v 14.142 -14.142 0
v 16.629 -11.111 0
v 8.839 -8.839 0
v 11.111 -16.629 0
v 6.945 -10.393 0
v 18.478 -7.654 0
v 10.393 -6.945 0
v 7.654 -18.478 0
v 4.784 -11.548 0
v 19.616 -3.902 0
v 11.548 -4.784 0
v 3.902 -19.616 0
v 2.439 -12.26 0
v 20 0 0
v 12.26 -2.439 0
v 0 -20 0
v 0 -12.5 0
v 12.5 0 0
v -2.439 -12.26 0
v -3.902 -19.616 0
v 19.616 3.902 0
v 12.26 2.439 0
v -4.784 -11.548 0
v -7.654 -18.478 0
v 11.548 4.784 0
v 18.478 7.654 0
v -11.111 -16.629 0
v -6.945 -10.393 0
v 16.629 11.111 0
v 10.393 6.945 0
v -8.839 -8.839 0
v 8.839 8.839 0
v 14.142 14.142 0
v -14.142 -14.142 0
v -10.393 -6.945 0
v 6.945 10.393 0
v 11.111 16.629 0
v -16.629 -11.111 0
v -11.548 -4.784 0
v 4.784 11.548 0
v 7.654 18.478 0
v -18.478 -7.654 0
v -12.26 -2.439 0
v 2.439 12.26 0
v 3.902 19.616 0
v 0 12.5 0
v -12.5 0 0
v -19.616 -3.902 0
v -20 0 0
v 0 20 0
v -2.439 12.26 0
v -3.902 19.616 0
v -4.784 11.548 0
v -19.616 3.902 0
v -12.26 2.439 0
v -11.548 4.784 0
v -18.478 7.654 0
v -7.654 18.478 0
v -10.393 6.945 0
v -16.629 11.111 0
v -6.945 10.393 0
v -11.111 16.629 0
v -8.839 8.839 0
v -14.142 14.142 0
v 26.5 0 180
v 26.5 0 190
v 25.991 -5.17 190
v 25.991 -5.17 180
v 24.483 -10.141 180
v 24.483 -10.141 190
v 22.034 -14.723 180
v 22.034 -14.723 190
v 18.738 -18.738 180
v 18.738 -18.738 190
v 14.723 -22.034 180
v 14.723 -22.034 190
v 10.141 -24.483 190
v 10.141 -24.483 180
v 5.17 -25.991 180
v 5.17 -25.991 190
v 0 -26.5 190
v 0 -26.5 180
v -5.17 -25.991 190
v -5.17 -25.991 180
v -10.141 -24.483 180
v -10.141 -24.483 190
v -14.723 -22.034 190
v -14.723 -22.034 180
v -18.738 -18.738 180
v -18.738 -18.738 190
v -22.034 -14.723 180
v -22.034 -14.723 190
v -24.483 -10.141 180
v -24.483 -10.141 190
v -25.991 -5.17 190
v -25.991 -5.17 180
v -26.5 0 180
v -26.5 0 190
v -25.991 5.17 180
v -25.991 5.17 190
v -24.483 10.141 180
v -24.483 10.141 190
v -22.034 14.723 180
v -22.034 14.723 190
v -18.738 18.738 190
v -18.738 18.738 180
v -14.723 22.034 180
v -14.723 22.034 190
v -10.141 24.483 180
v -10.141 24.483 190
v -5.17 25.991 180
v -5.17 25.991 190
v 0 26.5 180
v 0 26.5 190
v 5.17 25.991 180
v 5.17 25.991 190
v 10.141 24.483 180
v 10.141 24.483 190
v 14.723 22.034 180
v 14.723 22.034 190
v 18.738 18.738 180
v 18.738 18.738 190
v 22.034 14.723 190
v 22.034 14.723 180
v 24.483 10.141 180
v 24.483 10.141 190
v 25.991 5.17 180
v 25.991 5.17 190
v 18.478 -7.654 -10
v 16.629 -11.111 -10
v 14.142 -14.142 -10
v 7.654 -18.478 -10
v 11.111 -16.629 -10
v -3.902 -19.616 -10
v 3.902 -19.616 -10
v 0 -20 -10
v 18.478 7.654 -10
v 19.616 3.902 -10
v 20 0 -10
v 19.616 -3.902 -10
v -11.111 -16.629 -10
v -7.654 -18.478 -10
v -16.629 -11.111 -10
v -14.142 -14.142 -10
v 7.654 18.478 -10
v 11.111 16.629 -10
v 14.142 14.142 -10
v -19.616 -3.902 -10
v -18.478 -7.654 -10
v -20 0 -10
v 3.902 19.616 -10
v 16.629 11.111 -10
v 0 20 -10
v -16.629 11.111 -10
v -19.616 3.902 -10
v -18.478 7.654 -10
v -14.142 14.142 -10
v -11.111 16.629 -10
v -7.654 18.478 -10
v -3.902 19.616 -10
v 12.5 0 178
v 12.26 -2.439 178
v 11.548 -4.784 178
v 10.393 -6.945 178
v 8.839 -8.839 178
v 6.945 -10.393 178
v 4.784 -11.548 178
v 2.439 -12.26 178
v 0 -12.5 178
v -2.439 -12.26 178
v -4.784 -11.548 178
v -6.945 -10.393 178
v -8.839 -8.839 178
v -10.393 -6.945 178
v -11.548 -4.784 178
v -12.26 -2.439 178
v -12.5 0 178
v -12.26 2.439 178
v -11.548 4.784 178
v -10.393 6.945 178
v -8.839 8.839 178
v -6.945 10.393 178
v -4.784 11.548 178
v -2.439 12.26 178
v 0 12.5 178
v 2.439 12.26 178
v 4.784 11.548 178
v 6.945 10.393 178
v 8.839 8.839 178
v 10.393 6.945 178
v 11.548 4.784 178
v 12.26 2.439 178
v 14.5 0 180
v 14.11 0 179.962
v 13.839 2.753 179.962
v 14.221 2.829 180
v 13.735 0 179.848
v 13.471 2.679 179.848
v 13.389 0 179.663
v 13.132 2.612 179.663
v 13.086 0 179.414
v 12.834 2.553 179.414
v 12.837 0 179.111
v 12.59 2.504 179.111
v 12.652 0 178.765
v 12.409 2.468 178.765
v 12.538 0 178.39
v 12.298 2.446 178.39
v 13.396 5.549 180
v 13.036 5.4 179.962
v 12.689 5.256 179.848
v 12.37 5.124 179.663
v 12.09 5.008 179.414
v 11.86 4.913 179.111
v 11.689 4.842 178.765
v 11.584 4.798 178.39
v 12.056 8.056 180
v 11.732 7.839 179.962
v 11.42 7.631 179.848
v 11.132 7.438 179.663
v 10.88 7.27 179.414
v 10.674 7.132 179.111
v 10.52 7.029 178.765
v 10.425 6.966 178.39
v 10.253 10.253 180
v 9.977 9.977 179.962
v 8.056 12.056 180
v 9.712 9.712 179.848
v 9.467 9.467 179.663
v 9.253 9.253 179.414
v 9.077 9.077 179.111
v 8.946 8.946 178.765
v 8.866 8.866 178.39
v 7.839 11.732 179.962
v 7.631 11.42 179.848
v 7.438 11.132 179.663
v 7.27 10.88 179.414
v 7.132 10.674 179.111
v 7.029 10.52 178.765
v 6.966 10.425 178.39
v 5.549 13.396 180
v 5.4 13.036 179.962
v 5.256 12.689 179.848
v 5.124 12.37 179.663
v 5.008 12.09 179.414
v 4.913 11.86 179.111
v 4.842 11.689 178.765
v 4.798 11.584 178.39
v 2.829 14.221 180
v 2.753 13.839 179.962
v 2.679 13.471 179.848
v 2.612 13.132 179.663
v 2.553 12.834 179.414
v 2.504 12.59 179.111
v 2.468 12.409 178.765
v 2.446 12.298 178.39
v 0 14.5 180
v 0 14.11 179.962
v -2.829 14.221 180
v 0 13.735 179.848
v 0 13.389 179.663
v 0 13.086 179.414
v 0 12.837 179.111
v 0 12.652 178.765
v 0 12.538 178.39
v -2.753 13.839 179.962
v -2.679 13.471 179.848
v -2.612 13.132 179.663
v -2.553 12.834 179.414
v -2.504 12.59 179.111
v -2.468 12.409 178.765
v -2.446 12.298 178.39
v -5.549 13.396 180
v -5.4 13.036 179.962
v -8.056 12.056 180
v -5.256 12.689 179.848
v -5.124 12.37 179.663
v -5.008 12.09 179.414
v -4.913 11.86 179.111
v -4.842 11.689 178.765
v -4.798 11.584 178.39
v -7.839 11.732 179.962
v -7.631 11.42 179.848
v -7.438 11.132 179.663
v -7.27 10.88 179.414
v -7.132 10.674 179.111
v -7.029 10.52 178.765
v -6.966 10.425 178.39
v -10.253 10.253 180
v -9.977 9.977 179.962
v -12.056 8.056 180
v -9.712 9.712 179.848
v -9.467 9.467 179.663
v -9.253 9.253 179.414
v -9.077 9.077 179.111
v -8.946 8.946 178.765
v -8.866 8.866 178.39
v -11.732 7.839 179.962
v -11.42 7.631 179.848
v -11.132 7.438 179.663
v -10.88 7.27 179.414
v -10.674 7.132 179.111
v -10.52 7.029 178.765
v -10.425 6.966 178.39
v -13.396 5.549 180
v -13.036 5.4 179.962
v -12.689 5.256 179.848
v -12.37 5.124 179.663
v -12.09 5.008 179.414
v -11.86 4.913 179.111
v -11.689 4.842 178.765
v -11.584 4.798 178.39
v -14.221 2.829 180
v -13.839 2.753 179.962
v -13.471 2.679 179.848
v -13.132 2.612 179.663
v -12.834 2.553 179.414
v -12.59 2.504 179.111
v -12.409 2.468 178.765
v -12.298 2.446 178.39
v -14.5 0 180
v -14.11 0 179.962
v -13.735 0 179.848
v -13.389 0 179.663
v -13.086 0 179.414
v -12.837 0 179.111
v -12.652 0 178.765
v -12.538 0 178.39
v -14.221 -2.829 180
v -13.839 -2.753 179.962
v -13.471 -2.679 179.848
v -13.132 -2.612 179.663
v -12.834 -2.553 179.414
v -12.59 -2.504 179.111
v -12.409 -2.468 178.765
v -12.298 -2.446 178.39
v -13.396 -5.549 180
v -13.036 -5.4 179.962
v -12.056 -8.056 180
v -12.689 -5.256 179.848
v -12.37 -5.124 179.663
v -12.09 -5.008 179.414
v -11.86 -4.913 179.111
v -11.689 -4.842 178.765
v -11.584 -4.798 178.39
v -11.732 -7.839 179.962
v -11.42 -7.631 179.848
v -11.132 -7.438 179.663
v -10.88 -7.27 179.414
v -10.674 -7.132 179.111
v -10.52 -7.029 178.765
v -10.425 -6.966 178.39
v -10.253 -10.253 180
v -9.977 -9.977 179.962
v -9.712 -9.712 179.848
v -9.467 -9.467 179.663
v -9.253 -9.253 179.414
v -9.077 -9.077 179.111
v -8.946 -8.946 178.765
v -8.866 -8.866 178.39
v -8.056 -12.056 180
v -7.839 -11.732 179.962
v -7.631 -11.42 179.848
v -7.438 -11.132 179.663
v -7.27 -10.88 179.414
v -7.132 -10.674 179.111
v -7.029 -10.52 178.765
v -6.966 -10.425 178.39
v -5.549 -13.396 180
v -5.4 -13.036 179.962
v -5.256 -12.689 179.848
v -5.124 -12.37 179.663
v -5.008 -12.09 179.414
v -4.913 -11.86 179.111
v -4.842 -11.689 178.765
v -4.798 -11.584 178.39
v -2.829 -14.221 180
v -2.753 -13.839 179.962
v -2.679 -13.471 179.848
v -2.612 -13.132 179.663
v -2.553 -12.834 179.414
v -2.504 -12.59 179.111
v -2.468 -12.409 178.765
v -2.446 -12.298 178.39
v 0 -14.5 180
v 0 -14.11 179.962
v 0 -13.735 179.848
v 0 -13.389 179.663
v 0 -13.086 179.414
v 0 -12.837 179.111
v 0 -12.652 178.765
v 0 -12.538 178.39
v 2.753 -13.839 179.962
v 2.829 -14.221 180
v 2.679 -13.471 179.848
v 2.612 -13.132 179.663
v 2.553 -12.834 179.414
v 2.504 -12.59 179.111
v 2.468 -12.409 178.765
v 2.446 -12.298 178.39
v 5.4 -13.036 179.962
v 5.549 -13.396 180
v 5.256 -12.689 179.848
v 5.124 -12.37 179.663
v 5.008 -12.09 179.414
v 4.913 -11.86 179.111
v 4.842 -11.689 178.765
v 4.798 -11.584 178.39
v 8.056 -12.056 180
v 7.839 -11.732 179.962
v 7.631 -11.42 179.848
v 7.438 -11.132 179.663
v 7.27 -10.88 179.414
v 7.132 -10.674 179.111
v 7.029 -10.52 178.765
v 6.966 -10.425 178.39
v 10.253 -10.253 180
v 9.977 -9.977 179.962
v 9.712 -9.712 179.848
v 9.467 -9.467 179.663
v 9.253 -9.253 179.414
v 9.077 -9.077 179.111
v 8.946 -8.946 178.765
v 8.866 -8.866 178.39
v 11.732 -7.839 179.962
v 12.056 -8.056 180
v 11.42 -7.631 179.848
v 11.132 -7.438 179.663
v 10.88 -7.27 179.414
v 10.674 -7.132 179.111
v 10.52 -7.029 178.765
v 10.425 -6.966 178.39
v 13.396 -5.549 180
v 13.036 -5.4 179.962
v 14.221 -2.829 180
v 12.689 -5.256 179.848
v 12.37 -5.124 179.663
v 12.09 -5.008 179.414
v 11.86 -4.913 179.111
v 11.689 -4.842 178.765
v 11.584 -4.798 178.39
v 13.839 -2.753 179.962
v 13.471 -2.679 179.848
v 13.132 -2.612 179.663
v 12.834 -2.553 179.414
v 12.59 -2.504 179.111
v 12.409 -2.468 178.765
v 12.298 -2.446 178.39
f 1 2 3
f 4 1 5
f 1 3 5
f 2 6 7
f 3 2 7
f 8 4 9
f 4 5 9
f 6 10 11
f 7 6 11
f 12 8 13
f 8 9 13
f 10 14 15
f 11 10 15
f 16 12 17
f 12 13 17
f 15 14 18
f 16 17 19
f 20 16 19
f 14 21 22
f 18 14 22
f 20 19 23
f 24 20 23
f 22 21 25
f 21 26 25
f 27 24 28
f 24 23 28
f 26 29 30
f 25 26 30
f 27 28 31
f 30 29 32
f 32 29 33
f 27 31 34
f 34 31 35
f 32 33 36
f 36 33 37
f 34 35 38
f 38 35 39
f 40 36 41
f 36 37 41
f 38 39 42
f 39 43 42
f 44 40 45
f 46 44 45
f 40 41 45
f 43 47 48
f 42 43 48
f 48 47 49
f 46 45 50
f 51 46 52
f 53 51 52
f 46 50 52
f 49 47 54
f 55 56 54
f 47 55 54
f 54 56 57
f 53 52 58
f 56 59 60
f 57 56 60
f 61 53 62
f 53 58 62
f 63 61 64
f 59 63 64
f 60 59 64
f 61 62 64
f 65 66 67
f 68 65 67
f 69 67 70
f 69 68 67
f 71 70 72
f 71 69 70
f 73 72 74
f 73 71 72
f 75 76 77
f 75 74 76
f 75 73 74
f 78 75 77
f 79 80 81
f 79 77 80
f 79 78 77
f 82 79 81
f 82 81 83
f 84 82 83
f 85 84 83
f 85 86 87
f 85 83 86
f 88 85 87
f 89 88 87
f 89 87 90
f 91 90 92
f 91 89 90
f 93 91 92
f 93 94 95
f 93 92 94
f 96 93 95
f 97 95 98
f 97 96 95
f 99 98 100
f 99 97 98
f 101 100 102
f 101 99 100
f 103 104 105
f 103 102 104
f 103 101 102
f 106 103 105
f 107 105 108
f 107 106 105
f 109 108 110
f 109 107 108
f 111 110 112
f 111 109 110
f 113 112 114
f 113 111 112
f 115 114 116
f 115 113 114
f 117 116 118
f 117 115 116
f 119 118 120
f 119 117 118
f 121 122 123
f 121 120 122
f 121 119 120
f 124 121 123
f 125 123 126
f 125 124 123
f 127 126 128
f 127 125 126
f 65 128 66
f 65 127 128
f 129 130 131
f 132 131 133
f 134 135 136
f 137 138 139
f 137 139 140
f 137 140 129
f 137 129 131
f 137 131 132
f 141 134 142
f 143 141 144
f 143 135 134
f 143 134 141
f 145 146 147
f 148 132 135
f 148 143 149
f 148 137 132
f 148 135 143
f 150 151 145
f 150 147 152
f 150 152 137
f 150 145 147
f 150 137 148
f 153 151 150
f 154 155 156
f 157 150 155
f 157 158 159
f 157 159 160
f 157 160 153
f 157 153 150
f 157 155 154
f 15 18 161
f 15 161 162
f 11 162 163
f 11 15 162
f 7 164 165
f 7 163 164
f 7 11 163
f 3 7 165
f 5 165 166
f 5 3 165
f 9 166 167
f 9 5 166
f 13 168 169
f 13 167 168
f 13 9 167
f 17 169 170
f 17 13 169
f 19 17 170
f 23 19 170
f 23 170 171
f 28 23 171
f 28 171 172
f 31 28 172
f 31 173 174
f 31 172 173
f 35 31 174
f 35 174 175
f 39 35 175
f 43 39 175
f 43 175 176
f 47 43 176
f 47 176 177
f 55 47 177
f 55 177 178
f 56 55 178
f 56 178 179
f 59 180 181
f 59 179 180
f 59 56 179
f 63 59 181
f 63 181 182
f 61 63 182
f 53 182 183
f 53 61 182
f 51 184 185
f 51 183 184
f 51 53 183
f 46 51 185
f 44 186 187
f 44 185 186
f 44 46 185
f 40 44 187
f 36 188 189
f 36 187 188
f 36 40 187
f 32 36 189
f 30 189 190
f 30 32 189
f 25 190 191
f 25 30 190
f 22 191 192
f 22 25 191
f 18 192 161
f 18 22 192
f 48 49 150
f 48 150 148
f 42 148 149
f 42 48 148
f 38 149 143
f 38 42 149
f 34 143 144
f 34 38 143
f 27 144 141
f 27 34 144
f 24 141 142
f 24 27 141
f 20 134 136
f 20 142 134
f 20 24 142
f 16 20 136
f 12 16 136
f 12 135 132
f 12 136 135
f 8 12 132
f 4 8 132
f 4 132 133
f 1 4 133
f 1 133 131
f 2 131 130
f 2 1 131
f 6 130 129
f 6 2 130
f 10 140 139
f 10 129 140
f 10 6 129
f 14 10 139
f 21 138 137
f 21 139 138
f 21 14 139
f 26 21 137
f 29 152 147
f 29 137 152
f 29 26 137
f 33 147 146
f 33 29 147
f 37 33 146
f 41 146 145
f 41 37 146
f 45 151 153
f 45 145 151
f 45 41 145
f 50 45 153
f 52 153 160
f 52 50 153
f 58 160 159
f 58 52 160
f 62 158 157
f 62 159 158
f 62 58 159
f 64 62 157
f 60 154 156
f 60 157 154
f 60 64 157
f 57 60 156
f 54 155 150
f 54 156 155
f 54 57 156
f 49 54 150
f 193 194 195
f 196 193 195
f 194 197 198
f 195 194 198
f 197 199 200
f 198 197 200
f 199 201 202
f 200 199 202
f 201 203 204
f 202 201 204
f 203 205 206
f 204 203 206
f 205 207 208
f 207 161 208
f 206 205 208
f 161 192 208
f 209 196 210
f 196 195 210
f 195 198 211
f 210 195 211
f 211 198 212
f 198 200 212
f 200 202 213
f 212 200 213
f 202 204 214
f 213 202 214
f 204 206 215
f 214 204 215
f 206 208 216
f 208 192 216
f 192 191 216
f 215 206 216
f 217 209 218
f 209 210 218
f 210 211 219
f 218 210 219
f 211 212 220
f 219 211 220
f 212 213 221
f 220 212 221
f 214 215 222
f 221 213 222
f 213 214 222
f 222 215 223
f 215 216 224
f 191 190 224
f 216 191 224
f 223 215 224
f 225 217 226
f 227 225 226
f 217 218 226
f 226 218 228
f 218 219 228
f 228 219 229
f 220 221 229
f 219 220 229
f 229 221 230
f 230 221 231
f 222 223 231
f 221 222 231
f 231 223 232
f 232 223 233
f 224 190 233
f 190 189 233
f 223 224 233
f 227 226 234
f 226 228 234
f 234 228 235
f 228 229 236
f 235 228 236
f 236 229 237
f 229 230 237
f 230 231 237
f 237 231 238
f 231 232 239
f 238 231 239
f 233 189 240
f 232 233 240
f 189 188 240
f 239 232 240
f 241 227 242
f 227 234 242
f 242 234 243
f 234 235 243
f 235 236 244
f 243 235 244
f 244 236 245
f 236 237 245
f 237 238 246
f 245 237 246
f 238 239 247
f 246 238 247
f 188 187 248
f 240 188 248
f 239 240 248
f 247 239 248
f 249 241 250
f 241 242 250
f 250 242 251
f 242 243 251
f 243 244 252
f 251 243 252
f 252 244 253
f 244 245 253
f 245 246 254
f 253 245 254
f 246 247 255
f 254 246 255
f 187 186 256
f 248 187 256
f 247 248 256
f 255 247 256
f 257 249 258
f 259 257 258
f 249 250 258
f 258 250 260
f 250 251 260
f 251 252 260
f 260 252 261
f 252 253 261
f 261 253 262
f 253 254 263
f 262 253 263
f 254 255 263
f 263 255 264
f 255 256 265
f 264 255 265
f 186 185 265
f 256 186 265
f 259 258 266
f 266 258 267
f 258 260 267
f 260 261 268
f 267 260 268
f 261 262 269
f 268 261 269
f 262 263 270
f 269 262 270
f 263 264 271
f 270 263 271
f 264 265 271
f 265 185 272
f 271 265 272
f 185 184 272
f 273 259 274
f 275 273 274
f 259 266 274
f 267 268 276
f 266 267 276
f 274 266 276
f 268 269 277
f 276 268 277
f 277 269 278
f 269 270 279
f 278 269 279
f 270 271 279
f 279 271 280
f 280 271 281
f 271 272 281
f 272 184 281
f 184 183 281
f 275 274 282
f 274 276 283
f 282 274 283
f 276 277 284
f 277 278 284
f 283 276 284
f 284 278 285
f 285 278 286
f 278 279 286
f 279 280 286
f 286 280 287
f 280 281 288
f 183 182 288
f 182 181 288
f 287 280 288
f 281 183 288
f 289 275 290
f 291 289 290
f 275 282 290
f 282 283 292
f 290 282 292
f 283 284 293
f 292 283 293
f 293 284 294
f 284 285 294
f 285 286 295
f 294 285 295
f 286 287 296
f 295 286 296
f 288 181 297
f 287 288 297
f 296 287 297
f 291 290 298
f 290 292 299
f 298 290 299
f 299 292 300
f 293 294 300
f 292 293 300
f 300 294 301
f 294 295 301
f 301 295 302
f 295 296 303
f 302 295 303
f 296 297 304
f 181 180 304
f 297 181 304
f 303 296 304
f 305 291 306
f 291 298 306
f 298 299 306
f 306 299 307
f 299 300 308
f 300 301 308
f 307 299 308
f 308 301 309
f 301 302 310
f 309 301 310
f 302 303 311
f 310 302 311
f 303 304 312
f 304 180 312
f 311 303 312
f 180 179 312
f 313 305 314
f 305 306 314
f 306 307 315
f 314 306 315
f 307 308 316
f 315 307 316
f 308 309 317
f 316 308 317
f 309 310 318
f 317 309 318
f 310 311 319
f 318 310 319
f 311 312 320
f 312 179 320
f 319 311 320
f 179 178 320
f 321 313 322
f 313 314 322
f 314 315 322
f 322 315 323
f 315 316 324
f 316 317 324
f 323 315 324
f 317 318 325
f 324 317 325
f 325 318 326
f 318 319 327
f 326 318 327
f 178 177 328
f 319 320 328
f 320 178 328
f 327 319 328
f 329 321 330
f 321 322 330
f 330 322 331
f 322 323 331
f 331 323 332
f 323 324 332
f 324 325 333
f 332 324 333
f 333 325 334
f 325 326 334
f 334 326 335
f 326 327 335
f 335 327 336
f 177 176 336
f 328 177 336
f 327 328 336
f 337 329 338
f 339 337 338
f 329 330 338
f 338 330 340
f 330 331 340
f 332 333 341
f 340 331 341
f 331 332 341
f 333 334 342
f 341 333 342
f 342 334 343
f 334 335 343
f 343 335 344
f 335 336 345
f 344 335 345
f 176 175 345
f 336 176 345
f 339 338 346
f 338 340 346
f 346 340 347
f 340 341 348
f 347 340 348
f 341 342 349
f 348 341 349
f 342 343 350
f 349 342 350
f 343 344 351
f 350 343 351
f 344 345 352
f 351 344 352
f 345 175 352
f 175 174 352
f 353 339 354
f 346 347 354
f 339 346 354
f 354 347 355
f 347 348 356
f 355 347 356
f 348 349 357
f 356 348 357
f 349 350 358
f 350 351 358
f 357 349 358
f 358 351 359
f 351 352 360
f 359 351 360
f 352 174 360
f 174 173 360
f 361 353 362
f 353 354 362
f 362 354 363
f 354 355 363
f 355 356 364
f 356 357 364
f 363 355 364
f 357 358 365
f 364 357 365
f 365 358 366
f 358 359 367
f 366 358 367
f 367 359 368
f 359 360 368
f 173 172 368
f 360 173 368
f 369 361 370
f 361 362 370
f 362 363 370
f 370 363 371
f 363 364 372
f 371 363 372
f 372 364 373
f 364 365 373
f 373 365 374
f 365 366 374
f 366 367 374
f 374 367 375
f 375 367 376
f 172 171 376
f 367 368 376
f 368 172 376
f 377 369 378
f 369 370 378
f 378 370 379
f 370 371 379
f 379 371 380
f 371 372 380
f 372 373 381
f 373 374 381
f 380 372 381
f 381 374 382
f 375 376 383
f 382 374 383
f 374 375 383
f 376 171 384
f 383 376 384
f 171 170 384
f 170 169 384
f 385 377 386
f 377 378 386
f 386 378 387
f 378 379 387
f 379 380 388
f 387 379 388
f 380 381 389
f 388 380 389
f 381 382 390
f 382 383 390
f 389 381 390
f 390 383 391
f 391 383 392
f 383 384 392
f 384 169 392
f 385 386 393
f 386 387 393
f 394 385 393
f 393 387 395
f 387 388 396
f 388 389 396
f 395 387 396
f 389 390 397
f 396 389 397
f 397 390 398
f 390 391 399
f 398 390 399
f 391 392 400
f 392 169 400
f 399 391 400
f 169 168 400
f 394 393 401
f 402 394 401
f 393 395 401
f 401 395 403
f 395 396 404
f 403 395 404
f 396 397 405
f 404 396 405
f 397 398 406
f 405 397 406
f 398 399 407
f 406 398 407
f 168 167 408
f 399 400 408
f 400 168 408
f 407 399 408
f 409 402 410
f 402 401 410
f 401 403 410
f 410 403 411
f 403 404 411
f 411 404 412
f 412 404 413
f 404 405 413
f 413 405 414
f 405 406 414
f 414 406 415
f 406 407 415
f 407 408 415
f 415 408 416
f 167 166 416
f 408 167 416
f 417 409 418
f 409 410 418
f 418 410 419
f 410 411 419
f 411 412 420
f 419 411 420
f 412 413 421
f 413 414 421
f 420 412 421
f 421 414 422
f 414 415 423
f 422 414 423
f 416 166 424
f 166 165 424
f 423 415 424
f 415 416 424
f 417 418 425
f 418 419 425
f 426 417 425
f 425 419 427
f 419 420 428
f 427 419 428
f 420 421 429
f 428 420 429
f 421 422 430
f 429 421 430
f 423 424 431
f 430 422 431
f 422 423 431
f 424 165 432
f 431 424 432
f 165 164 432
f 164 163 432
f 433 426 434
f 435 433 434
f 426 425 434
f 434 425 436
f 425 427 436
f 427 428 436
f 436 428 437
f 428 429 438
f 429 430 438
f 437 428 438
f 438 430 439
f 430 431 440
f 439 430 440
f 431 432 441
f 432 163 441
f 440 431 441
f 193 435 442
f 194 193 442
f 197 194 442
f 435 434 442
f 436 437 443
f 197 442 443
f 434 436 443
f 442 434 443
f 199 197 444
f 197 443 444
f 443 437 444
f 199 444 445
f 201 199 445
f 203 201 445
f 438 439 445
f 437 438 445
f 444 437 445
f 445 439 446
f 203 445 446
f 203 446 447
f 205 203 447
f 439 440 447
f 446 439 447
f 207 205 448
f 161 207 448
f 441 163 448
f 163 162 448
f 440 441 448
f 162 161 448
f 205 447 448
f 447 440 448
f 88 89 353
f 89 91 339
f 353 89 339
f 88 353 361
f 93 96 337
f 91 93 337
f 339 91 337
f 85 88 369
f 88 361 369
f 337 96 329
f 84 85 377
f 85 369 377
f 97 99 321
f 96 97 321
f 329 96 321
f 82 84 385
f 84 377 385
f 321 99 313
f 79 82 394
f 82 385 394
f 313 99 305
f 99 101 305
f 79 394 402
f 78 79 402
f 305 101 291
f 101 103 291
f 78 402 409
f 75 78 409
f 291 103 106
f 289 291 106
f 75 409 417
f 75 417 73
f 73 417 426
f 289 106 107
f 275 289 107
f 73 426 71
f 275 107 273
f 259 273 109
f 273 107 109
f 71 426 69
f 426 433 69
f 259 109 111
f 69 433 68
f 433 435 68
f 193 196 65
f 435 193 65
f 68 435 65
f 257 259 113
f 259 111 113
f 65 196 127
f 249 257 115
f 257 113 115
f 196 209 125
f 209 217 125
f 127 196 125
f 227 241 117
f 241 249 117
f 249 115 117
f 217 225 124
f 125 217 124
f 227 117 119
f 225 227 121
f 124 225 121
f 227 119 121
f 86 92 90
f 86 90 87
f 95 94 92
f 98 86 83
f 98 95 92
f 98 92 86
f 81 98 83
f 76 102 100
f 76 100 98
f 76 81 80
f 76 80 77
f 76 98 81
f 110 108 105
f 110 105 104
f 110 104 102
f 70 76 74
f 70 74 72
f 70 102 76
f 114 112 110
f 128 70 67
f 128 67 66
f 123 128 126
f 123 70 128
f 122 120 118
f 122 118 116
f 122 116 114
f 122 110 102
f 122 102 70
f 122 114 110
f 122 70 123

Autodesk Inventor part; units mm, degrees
ref_plane "YZ Plane" through (0, 0, 0) normal (1, 0, 0) x (0, 1, 0)
ref_plane "XZ Plane" through (0, 0, 0) normal (0, 1, 0) x (-1, 0, 0)
ref_plane "XY Plane" through (0, 0, 0) normal (0, 0, 1) x (1, 0, 0)
sketch "Sketch1" plane through (0, 0, 0) normal (0, 0, 1) x (1, 0, 0)
  circle A0 centre (0, 0) radius 12.5
  dimension "d0" = 25
extrude "Extrusion1" add sketch "Sketch1" along normal blind 180
sketch "Sketch2" plane through (0, 0, 180) normal (0, 0, 1) x (1, 0, 0)
  circle A0 centre (0, 0) radius 26.5
  dimension "d3" = 53
extrude "Extrusion2" add sketch "Sketch2" along normal blind 10
fillet "Fillet1" radius 2 1 edges at (-12.5, 0, 180)
sketch "Sketch3" plane through (0, 0, 0) normal (0, 0, -1) x (-1, 0, 0)
  circle A0 centre (0, 0) radius 20
  dimension "d7" = 40
extrude "Extrusion3" add sketch "Sketch3" along normal blind 10
properties part number "PISTON"
